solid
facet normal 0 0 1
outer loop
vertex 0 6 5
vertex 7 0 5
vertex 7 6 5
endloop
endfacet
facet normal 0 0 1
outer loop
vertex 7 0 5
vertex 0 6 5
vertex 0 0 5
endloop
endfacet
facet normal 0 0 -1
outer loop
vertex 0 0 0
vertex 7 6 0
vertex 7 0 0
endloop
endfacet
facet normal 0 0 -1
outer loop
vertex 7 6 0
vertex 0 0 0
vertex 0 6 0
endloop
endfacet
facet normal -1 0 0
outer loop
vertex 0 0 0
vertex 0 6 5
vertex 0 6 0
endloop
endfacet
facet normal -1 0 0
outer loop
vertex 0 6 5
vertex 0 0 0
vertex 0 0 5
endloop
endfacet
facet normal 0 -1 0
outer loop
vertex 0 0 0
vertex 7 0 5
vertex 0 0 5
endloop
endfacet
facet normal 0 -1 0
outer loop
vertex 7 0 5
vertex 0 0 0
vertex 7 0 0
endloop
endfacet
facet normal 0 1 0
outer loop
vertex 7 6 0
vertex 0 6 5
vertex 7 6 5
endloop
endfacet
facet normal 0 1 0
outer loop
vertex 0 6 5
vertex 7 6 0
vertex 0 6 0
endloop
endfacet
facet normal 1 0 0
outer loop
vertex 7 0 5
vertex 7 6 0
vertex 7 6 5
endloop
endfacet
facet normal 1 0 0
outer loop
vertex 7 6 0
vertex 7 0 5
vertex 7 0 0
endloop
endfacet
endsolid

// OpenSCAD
translate([1.5, 1.0, 2.5]) color([0.6343562920465169, 0.27254621857246664, 0.016558424522952975]) cube([3, 2, 5], center=true);
translate([1.5, 3.0, 2.5]) color([0.6148716567717017, 0.7119066573597548, 0.17257617960039529]) cube([3, 2, 5], center=true);
translate([1.5, 5.0, 2.5]) color([0.41465974039415787, 0.21806470516739018, 0.8797884787327306]) cube([3, 2, 5], center=true);
translate([4.0, 1.5, 2.5]) color([0.9971497033508181, 0.006439244314443648, 0.5355241113549698]) cube([2, 3, 5], center=true);
translate([4.0, 4.5, 2.5]) color([0.428269623660265, 0.0497703561320445, 0.3846945959716809]) cube([2, 3, 5], center=true);
translate([6.0, 1.5, 2.5]) color([0.27248481749180187, 0.9711494351721061, 0.5646669518865992]) cube([2, 3, 5], center=true);
translate([6.0, 4.5, 2.5]) color([0.22956269737245216, 0.7165492601952248, 0.5466375027642284]) cube([2, 3, 5], center=true);
